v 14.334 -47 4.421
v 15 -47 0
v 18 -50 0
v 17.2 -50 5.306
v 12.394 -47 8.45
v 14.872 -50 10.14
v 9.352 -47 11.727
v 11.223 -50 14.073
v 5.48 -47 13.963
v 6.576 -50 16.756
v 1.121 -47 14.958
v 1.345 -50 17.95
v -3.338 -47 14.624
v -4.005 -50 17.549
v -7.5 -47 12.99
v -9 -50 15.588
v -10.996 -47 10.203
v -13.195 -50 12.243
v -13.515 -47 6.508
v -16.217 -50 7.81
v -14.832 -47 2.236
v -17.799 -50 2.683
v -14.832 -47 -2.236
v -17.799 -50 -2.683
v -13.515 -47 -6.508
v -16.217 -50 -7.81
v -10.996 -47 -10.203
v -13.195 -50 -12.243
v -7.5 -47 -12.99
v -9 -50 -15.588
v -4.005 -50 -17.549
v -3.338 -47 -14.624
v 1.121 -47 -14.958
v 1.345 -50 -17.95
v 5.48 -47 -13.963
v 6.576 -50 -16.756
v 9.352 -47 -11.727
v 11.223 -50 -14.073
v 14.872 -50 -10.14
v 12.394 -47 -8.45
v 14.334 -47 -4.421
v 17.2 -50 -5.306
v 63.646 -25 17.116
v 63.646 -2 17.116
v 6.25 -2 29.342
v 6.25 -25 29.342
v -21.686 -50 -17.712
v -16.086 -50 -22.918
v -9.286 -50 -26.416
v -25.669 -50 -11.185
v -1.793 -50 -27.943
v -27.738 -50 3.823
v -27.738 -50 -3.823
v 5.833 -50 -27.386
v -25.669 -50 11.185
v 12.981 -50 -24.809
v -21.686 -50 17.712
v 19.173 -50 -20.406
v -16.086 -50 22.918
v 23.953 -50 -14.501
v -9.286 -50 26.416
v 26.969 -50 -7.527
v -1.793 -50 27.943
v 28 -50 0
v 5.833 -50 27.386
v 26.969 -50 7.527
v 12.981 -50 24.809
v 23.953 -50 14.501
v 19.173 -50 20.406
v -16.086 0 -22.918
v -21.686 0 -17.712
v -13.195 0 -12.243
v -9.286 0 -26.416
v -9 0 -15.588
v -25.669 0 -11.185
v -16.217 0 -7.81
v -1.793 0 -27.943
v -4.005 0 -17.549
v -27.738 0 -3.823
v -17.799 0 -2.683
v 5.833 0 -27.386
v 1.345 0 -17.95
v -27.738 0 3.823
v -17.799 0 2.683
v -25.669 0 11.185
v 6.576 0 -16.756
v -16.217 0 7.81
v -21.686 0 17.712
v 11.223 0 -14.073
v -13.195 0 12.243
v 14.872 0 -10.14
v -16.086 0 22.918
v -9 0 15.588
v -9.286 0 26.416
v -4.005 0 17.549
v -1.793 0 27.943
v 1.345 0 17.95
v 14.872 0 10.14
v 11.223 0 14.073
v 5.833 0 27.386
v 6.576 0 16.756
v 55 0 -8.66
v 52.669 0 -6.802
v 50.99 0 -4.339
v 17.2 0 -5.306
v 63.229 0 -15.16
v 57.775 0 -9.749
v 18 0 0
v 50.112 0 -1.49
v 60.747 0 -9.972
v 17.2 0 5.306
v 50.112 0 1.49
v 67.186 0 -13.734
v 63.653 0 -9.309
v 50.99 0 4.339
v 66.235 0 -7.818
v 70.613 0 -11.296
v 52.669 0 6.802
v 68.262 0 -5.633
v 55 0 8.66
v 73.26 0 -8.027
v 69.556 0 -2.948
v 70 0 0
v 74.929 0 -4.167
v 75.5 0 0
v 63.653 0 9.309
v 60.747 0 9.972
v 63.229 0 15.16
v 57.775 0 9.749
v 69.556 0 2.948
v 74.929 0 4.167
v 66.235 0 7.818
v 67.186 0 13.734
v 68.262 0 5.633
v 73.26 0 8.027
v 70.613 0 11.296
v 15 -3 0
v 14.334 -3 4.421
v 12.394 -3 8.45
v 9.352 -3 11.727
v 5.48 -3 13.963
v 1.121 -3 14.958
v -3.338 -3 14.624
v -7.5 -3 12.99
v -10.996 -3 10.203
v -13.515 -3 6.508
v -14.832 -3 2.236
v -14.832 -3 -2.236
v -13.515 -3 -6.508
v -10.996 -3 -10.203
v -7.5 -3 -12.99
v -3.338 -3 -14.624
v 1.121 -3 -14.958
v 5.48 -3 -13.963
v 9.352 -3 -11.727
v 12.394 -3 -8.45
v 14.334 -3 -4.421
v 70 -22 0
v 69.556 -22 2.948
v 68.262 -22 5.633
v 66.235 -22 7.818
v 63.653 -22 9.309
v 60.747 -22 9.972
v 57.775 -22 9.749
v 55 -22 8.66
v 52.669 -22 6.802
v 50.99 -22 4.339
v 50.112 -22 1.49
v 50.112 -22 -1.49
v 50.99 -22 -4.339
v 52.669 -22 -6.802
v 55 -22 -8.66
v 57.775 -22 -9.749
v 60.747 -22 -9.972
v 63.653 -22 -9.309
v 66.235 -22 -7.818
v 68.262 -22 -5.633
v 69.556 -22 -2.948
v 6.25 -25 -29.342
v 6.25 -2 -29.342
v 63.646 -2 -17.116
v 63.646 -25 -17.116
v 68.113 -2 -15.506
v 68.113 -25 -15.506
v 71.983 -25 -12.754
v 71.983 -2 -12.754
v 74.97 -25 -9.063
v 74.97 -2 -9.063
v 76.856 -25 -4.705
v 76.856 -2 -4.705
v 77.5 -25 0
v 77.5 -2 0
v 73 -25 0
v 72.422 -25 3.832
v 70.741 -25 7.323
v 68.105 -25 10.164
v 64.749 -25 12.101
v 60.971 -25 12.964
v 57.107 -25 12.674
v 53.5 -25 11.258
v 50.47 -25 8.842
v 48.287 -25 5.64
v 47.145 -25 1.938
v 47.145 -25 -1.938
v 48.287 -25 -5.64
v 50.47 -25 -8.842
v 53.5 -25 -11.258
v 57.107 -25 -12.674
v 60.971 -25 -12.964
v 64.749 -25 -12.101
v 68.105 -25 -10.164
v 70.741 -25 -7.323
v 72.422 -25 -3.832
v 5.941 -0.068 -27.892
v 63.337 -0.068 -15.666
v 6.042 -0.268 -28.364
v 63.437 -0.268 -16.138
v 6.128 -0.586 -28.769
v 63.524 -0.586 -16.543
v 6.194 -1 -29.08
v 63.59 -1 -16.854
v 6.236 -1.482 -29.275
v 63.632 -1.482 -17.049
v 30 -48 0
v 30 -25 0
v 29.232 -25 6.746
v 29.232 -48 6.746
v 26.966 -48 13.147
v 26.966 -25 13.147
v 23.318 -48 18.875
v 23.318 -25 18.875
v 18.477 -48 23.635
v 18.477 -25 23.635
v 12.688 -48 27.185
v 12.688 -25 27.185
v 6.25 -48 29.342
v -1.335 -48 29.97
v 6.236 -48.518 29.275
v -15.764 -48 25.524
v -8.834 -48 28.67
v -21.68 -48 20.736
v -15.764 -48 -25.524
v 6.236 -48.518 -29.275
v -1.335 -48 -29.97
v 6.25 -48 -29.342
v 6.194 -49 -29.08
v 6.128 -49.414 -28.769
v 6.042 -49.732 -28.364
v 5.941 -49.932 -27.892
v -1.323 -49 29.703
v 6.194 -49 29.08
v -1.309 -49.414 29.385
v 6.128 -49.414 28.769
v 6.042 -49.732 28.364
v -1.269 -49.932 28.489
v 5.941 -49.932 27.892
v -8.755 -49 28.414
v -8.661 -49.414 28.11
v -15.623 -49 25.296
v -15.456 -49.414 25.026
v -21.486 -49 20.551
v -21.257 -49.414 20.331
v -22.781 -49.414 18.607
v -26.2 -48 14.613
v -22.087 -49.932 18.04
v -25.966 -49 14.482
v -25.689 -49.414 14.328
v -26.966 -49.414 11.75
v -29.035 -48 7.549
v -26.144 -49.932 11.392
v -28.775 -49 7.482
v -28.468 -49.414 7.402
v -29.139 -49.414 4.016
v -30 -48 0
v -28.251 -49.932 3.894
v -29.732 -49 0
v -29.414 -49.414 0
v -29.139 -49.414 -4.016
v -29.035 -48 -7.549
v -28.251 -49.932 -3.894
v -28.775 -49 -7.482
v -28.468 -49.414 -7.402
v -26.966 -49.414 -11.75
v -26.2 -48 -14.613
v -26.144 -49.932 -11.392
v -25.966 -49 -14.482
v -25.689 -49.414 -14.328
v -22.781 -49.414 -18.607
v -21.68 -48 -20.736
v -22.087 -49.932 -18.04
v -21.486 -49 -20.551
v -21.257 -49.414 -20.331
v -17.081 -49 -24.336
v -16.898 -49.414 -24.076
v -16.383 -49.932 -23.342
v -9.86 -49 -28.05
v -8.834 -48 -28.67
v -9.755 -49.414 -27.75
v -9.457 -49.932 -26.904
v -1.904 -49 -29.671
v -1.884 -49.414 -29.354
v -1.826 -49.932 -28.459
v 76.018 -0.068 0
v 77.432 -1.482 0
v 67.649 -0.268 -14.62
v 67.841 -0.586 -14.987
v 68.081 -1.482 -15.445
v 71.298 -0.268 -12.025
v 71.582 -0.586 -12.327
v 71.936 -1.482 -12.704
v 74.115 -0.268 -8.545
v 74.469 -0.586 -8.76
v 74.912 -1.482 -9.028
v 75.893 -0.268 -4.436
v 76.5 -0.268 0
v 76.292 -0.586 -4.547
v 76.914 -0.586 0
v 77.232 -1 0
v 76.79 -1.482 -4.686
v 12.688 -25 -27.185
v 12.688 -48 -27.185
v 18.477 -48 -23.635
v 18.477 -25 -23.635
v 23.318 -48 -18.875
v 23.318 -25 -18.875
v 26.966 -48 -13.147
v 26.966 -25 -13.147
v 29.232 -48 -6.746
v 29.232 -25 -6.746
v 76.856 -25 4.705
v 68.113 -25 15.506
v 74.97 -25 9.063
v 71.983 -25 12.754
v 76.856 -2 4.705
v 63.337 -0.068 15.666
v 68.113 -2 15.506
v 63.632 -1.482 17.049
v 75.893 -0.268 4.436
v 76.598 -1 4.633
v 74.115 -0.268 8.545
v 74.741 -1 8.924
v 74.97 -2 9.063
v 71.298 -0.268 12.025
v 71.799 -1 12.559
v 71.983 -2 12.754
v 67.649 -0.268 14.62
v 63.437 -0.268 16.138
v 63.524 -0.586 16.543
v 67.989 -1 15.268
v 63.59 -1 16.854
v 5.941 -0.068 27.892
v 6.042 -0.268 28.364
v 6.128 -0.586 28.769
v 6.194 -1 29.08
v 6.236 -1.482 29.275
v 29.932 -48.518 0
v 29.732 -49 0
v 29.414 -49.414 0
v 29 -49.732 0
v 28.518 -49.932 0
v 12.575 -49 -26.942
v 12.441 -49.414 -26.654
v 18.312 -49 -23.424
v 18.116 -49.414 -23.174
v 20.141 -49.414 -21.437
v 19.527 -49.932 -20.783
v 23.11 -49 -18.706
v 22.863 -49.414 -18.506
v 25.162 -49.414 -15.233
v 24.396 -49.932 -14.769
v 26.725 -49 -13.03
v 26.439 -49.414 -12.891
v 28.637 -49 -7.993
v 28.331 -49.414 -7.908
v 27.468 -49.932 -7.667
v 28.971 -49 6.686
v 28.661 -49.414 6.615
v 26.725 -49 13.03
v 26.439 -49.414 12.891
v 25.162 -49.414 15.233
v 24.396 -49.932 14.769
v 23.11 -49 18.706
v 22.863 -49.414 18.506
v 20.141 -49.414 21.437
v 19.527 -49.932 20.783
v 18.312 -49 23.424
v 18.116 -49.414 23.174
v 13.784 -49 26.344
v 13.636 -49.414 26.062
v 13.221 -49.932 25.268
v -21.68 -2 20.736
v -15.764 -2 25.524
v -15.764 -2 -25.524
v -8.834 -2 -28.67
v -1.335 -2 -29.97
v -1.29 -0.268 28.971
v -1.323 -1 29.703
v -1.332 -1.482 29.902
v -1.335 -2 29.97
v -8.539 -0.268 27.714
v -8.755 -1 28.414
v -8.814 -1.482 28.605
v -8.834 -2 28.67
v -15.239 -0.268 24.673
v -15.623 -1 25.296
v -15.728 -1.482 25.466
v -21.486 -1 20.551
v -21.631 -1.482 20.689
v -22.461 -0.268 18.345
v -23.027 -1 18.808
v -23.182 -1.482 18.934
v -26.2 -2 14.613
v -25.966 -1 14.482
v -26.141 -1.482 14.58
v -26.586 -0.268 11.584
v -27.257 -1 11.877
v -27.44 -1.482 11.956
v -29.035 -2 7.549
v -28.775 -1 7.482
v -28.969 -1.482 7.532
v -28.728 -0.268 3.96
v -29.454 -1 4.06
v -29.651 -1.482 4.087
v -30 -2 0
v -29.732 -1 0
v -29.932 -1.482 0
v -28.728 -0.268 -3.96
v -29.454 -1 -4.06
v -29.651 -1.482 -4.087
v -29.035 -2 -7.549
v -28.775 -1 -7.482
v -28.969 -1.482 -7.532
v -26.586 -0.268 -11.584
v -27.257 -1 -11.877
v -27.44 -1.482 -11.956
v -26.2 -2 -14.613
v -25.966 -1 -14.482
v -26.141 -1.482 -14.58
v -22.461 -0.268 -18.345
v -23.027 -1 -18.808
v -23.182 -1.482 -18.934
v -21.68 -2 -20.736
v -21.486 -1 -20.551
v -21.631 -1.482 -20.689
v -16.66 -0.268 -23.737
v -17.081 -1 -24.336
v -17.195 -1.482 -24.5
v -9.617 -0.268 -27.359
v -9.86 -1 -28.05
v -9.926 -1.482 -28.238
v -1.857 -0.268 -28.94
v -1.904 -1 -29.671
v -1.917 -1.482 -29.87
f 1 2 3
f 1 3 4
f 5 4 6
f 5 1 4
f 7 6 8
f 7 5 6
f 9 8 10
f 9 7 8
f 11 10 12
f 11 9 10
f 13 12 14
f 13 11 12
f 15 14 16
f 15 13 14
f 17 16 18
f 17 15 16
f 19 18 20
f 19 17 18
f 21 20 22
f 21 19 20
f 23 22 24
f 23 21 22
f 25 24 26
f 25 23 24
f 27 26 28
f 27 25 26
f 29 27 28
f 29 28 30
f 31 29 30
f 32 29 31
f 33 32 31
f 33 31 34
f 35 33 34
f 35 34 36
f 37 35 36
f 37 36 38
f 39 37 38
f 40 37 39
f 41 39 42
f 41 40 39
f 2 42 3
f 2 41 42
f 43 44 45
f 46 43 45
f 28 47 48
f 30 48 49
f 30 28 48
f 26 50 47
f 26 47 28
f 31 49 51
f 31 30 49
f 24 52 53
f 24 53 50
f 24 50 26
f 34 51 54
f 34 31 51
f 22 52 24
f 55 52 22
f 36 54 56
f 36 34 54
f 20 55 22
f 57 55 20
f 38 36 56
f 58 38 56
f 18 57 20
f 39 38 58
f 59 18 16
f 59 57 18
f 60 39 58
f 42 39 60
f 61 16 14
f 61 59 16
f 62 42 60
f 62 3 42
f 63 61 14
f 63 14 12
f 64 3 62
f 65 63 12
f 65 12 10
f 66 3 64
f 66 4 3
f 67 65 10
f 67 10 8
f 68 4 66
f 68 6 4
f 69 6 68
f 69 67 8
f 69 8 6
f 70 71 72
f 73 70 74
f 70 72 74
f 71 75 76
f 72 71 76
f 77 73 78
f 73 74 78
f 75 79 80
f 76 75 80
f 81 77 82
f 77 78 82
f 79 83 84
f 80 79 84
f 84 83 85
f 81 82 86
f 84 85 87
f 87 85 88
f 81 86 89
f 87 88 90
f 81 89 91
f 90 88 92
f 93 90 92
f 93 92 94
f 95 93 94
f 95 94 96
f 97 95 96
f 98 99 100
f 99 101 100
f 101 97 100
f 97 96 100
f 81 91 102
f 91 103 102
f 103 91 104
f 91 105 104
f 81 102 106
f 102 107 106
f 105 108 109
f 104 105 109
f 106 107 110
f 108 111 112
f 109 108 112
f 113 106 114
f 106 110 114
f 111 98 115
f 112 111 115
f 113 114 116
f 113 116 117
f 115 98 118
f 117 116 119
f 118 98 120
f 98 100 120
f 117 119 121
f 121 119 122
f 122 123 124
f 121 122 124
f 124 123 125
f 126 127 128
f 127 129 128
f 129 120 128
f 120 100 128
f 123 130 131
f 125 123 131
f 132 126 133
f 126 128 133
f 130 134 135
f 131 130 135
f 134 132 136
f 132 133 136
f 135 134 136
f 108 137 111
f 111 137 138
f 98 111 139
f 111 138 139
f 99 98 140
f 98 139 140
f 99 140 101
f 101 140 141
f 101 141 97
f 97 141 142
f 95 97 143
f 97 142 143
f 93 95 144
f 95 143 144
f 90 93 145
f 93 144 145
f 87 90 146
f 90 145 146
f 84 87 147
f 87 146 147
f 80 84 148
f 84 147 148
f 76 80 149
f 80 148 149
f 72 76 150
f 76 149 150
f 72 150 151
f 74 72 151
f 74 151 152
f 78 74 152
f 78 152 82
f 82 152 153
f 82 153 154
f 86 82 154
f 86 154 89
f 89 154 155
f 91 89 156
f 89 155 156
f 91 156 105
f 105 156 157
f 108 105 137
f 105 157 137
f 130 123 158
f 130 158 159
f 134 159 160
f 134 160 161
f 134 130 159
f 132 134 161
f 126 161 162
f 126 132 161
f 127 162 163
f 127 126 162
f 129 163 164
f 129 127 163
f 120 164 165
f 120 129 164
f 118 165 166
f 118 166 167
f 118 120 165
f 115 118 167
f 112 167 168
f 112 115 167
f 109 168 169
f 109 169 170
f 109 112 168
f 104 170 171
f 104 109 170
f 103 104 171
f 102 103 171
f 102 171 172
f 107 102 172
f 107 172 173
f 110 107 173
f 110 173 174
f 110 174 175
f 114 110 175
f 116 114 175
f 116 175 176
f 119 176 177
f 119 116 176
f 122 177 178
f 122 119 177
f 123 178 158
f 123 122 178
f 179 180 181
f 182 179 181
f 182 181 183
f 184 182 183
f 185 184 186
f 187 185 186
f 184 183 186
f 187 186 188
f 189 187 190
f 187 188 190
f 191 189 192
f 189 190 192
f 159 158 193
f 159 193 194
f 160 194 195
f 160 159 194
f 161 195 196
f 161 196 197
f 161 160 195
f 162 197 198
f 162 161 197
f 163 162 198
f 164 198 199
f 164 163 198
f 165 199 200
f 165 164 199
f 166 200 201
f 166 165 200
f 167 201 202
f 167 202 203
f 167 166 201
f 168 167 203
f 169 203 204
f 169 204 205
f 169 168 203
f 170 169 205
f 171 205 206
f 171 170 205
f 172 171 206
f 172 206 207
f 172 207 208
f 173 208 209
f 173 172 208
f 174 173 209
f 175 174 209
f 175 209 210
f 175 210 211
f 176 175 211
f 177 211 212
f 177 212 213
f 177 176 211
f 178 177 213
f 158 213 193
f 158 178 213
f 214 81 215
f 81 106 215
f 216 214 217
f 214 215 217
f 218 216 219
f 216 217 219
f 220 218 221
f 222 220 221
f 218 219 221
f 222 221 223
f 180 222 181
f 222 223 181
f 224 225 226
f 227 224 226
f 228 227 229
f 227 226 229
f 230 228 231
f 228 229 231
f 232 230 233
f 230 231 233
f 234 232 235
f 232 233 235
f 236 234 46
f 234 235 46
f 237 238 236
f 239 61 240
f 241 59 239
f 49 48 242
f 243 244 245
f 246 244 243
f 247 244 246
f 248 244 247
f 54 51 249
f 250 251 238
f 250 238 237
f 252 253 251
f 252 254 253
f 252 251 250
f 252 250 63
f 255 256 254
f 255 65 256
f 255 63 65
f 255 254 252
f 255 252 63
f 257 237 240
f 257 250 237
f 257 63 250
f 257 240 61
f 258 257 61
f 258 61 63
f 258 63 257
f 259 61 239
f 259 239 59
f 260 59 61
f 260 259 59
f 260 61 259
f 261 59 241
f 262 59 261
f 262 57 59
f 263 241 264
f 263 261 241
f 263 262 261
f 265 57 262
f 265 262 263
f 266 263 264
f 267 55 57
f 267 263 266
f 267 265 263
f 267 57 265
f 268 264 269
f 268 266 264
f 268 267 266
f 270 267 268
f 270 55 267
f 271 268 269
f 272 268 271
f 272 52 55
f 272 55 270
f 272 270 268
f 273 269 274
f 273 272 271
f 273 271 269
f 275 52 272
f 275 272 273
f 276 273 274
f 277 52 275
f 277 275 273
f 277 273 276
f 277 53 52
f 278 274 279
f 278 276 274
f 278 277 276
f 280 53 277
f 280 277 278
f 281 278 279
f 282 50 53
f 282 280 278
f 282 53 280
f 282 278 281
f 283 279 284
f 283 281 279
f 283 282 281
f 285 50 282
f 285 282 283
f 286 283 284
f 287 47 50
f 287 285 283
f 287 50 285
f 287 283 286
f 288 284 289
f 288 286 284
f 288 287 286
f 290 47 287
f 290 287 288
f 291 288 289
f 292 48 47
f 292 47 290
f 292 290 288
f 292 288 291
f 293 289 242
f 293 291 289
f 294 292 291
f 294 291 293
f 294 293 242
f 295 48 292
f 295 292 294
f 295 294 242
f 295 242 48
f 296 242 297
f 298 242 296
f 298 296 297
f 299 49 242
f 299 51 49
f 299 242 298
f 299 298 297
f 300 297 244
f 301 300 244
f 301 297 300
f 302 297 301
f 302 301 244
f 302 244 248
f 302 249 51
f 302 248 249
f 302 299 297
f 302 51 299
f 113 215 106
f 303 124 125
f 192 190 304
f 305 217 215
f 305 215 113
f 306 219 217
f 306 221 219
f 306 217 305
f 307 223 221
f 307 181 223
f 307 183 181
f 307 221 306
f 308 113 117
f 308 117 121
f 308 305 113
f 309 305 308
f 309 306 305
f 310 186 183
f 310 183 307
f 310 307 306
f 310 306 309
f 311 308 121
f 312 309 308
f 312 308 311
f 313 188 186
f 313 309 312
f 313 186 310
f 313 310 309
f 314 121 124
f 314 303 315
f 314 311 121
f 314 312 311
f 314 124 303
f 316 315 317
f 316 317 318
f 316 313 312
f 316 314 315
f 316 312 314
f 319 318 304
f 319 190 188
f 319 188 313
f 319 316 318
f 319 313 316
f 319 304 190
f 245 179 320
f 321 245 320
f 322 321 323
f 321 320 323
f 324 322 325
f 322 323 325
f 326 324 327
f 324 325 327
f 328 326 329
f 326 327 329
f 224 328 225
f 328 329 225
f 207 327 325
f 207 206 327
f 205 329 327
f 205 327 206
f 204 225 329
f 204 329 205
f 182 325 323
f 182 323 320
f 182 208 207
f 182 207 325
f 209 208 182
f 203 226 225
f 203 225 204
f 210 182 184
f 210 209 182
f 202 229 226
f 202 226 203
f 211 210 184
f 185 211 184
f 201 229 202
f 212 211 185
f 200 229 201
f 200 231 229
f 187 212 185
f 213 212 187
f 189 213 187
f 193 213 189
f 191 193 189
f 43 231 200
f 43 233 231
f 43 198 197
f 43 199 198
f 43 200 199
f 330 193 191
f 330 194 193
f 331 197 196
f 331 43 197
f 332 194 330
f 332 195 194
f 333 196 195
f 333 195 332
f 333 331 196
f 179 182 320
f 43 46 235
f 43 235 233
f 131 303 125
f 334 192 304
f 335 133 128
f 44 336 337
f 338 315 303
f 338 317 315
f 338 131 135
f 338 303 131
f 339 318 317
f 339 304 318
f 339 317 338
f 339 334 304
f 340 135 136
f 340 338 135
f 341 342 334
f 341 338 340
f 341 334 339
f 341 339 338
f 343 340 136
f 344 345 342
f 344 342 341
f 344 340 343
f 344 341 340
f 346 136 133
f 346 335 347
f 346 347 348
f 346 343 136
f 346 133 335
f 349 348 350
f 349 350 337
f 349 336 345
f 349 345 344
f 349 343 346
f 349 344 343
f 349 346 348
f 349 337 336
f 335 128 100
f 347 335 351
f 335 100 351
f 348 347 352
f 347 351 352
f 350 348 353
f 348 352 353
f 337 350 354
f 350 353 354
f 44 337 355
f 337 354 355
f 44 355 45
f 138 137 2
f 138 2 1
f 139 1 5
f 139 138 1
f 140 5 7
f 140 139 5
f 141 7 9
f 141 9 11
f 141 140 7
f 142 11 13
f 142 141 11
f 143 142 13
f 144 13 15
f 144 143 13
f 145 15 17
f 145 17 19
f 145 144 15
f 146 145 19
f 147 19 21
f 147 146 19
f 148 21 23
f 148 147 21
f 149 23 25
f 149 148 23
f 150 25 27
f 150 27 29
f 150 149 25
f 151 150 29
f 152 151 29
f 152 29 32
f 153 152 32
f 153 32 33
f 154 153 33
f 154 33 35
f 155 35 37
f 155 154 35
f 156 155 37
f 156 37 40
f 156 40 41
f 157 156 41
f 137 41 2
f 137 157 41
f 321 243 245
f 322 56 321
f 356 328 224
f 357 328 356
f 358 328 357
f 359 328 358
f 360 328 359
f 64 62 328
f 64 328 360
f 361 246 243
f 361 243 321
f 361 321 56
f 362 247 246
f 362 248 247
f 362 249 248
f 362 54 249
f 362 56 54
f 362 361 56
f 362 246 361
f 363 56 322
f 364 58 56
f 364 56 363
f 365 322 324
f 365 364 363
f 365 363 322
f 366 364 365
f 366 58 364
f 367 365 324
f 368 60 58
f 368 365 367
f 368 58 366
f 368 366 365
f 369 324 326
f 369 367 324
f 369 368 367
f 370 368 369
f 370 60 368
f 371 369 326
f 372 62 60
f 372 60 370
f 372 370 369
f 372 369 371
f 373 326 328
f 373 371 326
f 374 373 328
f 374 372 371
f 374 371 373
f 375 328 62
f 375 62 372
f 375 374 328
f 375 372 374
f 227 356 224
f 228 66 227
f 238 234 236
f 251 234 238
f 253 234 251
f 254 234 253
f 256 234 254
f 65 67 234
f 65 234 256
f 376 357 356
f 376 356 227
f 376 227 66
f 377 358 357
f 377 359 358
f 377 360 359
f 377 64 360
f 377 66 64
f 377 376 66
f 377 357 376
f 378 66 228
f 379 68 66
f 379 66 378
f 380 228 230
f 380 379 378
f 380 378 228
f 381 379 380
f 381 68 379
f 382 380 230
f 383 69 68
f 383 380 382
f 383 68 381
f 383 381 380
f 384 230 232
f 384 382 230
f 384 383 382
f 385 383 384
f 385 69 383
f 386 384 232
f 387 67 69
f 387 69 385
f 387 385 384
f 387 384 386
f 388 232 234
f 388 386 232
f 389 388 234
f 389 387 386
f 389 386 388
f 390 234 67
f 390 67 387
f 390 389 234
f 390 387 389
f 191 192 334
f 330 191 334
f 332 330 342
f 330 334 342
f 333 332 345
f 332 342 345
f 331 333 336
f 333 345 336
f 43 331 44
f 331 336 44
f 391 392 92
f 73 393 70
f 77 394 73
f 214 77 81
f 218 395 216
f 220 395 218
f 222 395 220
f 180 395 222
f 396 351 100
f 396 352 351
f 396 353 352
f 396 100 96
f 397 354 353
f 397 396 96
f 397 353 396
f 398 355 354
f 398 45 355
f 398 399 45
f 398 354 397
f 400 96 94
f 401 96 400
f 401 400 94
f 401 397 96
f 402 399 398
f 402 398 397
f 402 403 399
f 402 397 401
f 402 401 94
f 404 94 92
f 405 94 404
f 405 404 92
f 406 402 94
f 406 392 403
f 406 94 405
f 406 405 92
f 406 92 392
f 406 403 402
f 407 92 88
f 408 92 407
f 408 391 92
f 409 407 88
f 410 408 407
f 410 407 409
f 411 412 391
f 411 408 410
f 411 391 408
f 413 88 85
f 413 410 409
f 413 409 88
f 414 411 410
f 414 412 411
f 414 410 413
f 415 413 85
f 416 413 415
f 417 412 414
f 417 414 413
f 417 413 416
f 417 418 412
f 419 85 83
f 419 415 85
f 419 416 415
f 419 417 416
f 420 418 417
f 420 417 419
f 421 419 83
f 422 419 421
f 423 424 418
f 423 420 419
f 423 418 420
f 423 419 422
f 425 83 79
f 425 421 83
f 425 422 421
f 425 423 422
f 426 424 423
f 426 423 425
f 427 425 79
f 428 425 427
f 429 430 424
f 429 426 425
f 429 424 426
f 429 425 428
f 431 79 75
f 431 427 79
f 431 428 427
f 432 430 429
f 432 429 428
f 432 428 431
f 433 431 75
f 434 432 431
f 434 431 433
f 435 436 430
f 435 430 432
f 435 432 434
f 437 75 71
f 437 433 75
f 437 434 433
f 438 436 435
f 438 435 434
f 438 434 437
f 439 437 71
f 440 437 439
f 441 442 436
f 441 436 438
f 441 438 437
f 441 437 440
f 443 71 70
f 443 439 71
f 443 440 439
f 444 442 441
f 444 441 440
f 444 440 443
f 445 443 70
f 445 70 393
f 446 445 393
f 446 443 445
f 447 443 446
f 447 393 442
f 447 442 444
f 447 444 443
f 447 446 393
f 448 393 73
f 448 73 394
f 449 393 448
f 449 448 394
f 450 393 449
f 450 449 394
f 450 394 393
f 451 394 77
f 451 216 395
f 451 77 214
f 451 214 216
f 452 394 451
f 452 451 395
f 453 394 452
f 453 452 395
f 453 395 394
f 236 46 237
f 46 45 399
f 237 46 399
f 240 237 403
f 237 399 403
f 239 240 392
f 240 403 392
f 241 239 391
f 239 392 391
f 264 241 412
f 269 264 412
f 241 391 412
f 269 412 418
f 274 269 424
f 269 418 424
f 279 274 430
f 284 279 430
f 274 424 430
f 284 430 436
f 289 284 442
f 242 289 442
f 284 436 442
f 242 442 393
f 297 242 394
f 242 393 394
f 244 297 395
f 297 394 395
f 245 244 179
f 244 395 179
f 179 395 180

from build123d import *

# Parameters (mm, degrees)
F0_R     = 15
F0_R_2   = 10
F1_DEPTH = 25
F2_DEPTH = 50
F3_R     = 2
F4_SIZE  = 3


with BuildPart() as f1:
    # F0 (on Front) → F1 (new body)
    with BuildSketch(Plane.XZ):
        with BuildLine():
            ThreePointArc((6.25, 29.341736), (23.318448, 18.874586), (30, 0))
            ThreePointArc((30, 0), (23.318448, -18.874586), (6.25, -29.341736))
            Line((6.25, -29.341736), (63.645833, -17.116013))
            ThreePointArc((63.645833, -17.116013), (42.5, 0), (63.645833, 17.116013))
            Line((63.645833, 17.116013), (6.25, 29.341736))
        make_face()
        with BuildLine():
            ThreePointArc((6.25, -29.341736), (23.318448, -18.874586), (30, 0))
            ThreePointArc((30, 0), (23.318448, 18.874586), (6.25, 29.341736))
            ThreePointArc((6.25, 29.341736), (-30, 0), (6.25, -29.341736))
        make_face()
        Circle(F0_R, mode=Mode.SUBTRACT)
        with BuildLine():
            ThreePointArc((77.5, 0), (73.602428, 11.010175), (63.645833, 17.116013))
            ThreePointArc((63.645833, 17.116013), (42.5, 0), (63.645833, -17.116013))
            ThreePointArc((63.645833, -17.116013), (73.602428, -11.010175), (77.5, 0))
        make_face()
        with Locations((60, 0)):
            Circle(F0_R_2, mode=Mode.SUBTRACT)
    extrude(amount=F1_DEPTH)

    # F0 (on Front) → F2 (join)
    with BuildSketch(Plane.XZ):
        with BuildLine():
            ThreePointArc((6.25, -29.341736), (23.318448, -18.874586), (30, 0))
            ThreePointArc((30, 0), (23.318448, 18.874586), (6.25, 29.341736))
            ThreePointArc((6.25, 29.341736), (-30, 0), (6.25, -29.341736))
        make_face()
        Circle(F0_R, mode=Mode.SUBTRACT)
    extrude(amount=F2_DEPTH)

    # F3
    f3_edges = [f1.edges().sort_by_distance(p)[0] for p in [
        (34.947917, 0, -23.228875),
        (-6.25, -50, 29.341736),
    ]]
    fillet(f3_edges, radius=F3_R)

    # F4
    f4_edges = [f1.edges().sort_by_distance(p)[0] for p in [
        (50, -25, 0),
        (-15, 0, 0),
        (15, -25, 0),
        (-15, -50, 0),
    ]]
    chamfer(f4_edges, length=F4_SIZE)


solid = f1.part
